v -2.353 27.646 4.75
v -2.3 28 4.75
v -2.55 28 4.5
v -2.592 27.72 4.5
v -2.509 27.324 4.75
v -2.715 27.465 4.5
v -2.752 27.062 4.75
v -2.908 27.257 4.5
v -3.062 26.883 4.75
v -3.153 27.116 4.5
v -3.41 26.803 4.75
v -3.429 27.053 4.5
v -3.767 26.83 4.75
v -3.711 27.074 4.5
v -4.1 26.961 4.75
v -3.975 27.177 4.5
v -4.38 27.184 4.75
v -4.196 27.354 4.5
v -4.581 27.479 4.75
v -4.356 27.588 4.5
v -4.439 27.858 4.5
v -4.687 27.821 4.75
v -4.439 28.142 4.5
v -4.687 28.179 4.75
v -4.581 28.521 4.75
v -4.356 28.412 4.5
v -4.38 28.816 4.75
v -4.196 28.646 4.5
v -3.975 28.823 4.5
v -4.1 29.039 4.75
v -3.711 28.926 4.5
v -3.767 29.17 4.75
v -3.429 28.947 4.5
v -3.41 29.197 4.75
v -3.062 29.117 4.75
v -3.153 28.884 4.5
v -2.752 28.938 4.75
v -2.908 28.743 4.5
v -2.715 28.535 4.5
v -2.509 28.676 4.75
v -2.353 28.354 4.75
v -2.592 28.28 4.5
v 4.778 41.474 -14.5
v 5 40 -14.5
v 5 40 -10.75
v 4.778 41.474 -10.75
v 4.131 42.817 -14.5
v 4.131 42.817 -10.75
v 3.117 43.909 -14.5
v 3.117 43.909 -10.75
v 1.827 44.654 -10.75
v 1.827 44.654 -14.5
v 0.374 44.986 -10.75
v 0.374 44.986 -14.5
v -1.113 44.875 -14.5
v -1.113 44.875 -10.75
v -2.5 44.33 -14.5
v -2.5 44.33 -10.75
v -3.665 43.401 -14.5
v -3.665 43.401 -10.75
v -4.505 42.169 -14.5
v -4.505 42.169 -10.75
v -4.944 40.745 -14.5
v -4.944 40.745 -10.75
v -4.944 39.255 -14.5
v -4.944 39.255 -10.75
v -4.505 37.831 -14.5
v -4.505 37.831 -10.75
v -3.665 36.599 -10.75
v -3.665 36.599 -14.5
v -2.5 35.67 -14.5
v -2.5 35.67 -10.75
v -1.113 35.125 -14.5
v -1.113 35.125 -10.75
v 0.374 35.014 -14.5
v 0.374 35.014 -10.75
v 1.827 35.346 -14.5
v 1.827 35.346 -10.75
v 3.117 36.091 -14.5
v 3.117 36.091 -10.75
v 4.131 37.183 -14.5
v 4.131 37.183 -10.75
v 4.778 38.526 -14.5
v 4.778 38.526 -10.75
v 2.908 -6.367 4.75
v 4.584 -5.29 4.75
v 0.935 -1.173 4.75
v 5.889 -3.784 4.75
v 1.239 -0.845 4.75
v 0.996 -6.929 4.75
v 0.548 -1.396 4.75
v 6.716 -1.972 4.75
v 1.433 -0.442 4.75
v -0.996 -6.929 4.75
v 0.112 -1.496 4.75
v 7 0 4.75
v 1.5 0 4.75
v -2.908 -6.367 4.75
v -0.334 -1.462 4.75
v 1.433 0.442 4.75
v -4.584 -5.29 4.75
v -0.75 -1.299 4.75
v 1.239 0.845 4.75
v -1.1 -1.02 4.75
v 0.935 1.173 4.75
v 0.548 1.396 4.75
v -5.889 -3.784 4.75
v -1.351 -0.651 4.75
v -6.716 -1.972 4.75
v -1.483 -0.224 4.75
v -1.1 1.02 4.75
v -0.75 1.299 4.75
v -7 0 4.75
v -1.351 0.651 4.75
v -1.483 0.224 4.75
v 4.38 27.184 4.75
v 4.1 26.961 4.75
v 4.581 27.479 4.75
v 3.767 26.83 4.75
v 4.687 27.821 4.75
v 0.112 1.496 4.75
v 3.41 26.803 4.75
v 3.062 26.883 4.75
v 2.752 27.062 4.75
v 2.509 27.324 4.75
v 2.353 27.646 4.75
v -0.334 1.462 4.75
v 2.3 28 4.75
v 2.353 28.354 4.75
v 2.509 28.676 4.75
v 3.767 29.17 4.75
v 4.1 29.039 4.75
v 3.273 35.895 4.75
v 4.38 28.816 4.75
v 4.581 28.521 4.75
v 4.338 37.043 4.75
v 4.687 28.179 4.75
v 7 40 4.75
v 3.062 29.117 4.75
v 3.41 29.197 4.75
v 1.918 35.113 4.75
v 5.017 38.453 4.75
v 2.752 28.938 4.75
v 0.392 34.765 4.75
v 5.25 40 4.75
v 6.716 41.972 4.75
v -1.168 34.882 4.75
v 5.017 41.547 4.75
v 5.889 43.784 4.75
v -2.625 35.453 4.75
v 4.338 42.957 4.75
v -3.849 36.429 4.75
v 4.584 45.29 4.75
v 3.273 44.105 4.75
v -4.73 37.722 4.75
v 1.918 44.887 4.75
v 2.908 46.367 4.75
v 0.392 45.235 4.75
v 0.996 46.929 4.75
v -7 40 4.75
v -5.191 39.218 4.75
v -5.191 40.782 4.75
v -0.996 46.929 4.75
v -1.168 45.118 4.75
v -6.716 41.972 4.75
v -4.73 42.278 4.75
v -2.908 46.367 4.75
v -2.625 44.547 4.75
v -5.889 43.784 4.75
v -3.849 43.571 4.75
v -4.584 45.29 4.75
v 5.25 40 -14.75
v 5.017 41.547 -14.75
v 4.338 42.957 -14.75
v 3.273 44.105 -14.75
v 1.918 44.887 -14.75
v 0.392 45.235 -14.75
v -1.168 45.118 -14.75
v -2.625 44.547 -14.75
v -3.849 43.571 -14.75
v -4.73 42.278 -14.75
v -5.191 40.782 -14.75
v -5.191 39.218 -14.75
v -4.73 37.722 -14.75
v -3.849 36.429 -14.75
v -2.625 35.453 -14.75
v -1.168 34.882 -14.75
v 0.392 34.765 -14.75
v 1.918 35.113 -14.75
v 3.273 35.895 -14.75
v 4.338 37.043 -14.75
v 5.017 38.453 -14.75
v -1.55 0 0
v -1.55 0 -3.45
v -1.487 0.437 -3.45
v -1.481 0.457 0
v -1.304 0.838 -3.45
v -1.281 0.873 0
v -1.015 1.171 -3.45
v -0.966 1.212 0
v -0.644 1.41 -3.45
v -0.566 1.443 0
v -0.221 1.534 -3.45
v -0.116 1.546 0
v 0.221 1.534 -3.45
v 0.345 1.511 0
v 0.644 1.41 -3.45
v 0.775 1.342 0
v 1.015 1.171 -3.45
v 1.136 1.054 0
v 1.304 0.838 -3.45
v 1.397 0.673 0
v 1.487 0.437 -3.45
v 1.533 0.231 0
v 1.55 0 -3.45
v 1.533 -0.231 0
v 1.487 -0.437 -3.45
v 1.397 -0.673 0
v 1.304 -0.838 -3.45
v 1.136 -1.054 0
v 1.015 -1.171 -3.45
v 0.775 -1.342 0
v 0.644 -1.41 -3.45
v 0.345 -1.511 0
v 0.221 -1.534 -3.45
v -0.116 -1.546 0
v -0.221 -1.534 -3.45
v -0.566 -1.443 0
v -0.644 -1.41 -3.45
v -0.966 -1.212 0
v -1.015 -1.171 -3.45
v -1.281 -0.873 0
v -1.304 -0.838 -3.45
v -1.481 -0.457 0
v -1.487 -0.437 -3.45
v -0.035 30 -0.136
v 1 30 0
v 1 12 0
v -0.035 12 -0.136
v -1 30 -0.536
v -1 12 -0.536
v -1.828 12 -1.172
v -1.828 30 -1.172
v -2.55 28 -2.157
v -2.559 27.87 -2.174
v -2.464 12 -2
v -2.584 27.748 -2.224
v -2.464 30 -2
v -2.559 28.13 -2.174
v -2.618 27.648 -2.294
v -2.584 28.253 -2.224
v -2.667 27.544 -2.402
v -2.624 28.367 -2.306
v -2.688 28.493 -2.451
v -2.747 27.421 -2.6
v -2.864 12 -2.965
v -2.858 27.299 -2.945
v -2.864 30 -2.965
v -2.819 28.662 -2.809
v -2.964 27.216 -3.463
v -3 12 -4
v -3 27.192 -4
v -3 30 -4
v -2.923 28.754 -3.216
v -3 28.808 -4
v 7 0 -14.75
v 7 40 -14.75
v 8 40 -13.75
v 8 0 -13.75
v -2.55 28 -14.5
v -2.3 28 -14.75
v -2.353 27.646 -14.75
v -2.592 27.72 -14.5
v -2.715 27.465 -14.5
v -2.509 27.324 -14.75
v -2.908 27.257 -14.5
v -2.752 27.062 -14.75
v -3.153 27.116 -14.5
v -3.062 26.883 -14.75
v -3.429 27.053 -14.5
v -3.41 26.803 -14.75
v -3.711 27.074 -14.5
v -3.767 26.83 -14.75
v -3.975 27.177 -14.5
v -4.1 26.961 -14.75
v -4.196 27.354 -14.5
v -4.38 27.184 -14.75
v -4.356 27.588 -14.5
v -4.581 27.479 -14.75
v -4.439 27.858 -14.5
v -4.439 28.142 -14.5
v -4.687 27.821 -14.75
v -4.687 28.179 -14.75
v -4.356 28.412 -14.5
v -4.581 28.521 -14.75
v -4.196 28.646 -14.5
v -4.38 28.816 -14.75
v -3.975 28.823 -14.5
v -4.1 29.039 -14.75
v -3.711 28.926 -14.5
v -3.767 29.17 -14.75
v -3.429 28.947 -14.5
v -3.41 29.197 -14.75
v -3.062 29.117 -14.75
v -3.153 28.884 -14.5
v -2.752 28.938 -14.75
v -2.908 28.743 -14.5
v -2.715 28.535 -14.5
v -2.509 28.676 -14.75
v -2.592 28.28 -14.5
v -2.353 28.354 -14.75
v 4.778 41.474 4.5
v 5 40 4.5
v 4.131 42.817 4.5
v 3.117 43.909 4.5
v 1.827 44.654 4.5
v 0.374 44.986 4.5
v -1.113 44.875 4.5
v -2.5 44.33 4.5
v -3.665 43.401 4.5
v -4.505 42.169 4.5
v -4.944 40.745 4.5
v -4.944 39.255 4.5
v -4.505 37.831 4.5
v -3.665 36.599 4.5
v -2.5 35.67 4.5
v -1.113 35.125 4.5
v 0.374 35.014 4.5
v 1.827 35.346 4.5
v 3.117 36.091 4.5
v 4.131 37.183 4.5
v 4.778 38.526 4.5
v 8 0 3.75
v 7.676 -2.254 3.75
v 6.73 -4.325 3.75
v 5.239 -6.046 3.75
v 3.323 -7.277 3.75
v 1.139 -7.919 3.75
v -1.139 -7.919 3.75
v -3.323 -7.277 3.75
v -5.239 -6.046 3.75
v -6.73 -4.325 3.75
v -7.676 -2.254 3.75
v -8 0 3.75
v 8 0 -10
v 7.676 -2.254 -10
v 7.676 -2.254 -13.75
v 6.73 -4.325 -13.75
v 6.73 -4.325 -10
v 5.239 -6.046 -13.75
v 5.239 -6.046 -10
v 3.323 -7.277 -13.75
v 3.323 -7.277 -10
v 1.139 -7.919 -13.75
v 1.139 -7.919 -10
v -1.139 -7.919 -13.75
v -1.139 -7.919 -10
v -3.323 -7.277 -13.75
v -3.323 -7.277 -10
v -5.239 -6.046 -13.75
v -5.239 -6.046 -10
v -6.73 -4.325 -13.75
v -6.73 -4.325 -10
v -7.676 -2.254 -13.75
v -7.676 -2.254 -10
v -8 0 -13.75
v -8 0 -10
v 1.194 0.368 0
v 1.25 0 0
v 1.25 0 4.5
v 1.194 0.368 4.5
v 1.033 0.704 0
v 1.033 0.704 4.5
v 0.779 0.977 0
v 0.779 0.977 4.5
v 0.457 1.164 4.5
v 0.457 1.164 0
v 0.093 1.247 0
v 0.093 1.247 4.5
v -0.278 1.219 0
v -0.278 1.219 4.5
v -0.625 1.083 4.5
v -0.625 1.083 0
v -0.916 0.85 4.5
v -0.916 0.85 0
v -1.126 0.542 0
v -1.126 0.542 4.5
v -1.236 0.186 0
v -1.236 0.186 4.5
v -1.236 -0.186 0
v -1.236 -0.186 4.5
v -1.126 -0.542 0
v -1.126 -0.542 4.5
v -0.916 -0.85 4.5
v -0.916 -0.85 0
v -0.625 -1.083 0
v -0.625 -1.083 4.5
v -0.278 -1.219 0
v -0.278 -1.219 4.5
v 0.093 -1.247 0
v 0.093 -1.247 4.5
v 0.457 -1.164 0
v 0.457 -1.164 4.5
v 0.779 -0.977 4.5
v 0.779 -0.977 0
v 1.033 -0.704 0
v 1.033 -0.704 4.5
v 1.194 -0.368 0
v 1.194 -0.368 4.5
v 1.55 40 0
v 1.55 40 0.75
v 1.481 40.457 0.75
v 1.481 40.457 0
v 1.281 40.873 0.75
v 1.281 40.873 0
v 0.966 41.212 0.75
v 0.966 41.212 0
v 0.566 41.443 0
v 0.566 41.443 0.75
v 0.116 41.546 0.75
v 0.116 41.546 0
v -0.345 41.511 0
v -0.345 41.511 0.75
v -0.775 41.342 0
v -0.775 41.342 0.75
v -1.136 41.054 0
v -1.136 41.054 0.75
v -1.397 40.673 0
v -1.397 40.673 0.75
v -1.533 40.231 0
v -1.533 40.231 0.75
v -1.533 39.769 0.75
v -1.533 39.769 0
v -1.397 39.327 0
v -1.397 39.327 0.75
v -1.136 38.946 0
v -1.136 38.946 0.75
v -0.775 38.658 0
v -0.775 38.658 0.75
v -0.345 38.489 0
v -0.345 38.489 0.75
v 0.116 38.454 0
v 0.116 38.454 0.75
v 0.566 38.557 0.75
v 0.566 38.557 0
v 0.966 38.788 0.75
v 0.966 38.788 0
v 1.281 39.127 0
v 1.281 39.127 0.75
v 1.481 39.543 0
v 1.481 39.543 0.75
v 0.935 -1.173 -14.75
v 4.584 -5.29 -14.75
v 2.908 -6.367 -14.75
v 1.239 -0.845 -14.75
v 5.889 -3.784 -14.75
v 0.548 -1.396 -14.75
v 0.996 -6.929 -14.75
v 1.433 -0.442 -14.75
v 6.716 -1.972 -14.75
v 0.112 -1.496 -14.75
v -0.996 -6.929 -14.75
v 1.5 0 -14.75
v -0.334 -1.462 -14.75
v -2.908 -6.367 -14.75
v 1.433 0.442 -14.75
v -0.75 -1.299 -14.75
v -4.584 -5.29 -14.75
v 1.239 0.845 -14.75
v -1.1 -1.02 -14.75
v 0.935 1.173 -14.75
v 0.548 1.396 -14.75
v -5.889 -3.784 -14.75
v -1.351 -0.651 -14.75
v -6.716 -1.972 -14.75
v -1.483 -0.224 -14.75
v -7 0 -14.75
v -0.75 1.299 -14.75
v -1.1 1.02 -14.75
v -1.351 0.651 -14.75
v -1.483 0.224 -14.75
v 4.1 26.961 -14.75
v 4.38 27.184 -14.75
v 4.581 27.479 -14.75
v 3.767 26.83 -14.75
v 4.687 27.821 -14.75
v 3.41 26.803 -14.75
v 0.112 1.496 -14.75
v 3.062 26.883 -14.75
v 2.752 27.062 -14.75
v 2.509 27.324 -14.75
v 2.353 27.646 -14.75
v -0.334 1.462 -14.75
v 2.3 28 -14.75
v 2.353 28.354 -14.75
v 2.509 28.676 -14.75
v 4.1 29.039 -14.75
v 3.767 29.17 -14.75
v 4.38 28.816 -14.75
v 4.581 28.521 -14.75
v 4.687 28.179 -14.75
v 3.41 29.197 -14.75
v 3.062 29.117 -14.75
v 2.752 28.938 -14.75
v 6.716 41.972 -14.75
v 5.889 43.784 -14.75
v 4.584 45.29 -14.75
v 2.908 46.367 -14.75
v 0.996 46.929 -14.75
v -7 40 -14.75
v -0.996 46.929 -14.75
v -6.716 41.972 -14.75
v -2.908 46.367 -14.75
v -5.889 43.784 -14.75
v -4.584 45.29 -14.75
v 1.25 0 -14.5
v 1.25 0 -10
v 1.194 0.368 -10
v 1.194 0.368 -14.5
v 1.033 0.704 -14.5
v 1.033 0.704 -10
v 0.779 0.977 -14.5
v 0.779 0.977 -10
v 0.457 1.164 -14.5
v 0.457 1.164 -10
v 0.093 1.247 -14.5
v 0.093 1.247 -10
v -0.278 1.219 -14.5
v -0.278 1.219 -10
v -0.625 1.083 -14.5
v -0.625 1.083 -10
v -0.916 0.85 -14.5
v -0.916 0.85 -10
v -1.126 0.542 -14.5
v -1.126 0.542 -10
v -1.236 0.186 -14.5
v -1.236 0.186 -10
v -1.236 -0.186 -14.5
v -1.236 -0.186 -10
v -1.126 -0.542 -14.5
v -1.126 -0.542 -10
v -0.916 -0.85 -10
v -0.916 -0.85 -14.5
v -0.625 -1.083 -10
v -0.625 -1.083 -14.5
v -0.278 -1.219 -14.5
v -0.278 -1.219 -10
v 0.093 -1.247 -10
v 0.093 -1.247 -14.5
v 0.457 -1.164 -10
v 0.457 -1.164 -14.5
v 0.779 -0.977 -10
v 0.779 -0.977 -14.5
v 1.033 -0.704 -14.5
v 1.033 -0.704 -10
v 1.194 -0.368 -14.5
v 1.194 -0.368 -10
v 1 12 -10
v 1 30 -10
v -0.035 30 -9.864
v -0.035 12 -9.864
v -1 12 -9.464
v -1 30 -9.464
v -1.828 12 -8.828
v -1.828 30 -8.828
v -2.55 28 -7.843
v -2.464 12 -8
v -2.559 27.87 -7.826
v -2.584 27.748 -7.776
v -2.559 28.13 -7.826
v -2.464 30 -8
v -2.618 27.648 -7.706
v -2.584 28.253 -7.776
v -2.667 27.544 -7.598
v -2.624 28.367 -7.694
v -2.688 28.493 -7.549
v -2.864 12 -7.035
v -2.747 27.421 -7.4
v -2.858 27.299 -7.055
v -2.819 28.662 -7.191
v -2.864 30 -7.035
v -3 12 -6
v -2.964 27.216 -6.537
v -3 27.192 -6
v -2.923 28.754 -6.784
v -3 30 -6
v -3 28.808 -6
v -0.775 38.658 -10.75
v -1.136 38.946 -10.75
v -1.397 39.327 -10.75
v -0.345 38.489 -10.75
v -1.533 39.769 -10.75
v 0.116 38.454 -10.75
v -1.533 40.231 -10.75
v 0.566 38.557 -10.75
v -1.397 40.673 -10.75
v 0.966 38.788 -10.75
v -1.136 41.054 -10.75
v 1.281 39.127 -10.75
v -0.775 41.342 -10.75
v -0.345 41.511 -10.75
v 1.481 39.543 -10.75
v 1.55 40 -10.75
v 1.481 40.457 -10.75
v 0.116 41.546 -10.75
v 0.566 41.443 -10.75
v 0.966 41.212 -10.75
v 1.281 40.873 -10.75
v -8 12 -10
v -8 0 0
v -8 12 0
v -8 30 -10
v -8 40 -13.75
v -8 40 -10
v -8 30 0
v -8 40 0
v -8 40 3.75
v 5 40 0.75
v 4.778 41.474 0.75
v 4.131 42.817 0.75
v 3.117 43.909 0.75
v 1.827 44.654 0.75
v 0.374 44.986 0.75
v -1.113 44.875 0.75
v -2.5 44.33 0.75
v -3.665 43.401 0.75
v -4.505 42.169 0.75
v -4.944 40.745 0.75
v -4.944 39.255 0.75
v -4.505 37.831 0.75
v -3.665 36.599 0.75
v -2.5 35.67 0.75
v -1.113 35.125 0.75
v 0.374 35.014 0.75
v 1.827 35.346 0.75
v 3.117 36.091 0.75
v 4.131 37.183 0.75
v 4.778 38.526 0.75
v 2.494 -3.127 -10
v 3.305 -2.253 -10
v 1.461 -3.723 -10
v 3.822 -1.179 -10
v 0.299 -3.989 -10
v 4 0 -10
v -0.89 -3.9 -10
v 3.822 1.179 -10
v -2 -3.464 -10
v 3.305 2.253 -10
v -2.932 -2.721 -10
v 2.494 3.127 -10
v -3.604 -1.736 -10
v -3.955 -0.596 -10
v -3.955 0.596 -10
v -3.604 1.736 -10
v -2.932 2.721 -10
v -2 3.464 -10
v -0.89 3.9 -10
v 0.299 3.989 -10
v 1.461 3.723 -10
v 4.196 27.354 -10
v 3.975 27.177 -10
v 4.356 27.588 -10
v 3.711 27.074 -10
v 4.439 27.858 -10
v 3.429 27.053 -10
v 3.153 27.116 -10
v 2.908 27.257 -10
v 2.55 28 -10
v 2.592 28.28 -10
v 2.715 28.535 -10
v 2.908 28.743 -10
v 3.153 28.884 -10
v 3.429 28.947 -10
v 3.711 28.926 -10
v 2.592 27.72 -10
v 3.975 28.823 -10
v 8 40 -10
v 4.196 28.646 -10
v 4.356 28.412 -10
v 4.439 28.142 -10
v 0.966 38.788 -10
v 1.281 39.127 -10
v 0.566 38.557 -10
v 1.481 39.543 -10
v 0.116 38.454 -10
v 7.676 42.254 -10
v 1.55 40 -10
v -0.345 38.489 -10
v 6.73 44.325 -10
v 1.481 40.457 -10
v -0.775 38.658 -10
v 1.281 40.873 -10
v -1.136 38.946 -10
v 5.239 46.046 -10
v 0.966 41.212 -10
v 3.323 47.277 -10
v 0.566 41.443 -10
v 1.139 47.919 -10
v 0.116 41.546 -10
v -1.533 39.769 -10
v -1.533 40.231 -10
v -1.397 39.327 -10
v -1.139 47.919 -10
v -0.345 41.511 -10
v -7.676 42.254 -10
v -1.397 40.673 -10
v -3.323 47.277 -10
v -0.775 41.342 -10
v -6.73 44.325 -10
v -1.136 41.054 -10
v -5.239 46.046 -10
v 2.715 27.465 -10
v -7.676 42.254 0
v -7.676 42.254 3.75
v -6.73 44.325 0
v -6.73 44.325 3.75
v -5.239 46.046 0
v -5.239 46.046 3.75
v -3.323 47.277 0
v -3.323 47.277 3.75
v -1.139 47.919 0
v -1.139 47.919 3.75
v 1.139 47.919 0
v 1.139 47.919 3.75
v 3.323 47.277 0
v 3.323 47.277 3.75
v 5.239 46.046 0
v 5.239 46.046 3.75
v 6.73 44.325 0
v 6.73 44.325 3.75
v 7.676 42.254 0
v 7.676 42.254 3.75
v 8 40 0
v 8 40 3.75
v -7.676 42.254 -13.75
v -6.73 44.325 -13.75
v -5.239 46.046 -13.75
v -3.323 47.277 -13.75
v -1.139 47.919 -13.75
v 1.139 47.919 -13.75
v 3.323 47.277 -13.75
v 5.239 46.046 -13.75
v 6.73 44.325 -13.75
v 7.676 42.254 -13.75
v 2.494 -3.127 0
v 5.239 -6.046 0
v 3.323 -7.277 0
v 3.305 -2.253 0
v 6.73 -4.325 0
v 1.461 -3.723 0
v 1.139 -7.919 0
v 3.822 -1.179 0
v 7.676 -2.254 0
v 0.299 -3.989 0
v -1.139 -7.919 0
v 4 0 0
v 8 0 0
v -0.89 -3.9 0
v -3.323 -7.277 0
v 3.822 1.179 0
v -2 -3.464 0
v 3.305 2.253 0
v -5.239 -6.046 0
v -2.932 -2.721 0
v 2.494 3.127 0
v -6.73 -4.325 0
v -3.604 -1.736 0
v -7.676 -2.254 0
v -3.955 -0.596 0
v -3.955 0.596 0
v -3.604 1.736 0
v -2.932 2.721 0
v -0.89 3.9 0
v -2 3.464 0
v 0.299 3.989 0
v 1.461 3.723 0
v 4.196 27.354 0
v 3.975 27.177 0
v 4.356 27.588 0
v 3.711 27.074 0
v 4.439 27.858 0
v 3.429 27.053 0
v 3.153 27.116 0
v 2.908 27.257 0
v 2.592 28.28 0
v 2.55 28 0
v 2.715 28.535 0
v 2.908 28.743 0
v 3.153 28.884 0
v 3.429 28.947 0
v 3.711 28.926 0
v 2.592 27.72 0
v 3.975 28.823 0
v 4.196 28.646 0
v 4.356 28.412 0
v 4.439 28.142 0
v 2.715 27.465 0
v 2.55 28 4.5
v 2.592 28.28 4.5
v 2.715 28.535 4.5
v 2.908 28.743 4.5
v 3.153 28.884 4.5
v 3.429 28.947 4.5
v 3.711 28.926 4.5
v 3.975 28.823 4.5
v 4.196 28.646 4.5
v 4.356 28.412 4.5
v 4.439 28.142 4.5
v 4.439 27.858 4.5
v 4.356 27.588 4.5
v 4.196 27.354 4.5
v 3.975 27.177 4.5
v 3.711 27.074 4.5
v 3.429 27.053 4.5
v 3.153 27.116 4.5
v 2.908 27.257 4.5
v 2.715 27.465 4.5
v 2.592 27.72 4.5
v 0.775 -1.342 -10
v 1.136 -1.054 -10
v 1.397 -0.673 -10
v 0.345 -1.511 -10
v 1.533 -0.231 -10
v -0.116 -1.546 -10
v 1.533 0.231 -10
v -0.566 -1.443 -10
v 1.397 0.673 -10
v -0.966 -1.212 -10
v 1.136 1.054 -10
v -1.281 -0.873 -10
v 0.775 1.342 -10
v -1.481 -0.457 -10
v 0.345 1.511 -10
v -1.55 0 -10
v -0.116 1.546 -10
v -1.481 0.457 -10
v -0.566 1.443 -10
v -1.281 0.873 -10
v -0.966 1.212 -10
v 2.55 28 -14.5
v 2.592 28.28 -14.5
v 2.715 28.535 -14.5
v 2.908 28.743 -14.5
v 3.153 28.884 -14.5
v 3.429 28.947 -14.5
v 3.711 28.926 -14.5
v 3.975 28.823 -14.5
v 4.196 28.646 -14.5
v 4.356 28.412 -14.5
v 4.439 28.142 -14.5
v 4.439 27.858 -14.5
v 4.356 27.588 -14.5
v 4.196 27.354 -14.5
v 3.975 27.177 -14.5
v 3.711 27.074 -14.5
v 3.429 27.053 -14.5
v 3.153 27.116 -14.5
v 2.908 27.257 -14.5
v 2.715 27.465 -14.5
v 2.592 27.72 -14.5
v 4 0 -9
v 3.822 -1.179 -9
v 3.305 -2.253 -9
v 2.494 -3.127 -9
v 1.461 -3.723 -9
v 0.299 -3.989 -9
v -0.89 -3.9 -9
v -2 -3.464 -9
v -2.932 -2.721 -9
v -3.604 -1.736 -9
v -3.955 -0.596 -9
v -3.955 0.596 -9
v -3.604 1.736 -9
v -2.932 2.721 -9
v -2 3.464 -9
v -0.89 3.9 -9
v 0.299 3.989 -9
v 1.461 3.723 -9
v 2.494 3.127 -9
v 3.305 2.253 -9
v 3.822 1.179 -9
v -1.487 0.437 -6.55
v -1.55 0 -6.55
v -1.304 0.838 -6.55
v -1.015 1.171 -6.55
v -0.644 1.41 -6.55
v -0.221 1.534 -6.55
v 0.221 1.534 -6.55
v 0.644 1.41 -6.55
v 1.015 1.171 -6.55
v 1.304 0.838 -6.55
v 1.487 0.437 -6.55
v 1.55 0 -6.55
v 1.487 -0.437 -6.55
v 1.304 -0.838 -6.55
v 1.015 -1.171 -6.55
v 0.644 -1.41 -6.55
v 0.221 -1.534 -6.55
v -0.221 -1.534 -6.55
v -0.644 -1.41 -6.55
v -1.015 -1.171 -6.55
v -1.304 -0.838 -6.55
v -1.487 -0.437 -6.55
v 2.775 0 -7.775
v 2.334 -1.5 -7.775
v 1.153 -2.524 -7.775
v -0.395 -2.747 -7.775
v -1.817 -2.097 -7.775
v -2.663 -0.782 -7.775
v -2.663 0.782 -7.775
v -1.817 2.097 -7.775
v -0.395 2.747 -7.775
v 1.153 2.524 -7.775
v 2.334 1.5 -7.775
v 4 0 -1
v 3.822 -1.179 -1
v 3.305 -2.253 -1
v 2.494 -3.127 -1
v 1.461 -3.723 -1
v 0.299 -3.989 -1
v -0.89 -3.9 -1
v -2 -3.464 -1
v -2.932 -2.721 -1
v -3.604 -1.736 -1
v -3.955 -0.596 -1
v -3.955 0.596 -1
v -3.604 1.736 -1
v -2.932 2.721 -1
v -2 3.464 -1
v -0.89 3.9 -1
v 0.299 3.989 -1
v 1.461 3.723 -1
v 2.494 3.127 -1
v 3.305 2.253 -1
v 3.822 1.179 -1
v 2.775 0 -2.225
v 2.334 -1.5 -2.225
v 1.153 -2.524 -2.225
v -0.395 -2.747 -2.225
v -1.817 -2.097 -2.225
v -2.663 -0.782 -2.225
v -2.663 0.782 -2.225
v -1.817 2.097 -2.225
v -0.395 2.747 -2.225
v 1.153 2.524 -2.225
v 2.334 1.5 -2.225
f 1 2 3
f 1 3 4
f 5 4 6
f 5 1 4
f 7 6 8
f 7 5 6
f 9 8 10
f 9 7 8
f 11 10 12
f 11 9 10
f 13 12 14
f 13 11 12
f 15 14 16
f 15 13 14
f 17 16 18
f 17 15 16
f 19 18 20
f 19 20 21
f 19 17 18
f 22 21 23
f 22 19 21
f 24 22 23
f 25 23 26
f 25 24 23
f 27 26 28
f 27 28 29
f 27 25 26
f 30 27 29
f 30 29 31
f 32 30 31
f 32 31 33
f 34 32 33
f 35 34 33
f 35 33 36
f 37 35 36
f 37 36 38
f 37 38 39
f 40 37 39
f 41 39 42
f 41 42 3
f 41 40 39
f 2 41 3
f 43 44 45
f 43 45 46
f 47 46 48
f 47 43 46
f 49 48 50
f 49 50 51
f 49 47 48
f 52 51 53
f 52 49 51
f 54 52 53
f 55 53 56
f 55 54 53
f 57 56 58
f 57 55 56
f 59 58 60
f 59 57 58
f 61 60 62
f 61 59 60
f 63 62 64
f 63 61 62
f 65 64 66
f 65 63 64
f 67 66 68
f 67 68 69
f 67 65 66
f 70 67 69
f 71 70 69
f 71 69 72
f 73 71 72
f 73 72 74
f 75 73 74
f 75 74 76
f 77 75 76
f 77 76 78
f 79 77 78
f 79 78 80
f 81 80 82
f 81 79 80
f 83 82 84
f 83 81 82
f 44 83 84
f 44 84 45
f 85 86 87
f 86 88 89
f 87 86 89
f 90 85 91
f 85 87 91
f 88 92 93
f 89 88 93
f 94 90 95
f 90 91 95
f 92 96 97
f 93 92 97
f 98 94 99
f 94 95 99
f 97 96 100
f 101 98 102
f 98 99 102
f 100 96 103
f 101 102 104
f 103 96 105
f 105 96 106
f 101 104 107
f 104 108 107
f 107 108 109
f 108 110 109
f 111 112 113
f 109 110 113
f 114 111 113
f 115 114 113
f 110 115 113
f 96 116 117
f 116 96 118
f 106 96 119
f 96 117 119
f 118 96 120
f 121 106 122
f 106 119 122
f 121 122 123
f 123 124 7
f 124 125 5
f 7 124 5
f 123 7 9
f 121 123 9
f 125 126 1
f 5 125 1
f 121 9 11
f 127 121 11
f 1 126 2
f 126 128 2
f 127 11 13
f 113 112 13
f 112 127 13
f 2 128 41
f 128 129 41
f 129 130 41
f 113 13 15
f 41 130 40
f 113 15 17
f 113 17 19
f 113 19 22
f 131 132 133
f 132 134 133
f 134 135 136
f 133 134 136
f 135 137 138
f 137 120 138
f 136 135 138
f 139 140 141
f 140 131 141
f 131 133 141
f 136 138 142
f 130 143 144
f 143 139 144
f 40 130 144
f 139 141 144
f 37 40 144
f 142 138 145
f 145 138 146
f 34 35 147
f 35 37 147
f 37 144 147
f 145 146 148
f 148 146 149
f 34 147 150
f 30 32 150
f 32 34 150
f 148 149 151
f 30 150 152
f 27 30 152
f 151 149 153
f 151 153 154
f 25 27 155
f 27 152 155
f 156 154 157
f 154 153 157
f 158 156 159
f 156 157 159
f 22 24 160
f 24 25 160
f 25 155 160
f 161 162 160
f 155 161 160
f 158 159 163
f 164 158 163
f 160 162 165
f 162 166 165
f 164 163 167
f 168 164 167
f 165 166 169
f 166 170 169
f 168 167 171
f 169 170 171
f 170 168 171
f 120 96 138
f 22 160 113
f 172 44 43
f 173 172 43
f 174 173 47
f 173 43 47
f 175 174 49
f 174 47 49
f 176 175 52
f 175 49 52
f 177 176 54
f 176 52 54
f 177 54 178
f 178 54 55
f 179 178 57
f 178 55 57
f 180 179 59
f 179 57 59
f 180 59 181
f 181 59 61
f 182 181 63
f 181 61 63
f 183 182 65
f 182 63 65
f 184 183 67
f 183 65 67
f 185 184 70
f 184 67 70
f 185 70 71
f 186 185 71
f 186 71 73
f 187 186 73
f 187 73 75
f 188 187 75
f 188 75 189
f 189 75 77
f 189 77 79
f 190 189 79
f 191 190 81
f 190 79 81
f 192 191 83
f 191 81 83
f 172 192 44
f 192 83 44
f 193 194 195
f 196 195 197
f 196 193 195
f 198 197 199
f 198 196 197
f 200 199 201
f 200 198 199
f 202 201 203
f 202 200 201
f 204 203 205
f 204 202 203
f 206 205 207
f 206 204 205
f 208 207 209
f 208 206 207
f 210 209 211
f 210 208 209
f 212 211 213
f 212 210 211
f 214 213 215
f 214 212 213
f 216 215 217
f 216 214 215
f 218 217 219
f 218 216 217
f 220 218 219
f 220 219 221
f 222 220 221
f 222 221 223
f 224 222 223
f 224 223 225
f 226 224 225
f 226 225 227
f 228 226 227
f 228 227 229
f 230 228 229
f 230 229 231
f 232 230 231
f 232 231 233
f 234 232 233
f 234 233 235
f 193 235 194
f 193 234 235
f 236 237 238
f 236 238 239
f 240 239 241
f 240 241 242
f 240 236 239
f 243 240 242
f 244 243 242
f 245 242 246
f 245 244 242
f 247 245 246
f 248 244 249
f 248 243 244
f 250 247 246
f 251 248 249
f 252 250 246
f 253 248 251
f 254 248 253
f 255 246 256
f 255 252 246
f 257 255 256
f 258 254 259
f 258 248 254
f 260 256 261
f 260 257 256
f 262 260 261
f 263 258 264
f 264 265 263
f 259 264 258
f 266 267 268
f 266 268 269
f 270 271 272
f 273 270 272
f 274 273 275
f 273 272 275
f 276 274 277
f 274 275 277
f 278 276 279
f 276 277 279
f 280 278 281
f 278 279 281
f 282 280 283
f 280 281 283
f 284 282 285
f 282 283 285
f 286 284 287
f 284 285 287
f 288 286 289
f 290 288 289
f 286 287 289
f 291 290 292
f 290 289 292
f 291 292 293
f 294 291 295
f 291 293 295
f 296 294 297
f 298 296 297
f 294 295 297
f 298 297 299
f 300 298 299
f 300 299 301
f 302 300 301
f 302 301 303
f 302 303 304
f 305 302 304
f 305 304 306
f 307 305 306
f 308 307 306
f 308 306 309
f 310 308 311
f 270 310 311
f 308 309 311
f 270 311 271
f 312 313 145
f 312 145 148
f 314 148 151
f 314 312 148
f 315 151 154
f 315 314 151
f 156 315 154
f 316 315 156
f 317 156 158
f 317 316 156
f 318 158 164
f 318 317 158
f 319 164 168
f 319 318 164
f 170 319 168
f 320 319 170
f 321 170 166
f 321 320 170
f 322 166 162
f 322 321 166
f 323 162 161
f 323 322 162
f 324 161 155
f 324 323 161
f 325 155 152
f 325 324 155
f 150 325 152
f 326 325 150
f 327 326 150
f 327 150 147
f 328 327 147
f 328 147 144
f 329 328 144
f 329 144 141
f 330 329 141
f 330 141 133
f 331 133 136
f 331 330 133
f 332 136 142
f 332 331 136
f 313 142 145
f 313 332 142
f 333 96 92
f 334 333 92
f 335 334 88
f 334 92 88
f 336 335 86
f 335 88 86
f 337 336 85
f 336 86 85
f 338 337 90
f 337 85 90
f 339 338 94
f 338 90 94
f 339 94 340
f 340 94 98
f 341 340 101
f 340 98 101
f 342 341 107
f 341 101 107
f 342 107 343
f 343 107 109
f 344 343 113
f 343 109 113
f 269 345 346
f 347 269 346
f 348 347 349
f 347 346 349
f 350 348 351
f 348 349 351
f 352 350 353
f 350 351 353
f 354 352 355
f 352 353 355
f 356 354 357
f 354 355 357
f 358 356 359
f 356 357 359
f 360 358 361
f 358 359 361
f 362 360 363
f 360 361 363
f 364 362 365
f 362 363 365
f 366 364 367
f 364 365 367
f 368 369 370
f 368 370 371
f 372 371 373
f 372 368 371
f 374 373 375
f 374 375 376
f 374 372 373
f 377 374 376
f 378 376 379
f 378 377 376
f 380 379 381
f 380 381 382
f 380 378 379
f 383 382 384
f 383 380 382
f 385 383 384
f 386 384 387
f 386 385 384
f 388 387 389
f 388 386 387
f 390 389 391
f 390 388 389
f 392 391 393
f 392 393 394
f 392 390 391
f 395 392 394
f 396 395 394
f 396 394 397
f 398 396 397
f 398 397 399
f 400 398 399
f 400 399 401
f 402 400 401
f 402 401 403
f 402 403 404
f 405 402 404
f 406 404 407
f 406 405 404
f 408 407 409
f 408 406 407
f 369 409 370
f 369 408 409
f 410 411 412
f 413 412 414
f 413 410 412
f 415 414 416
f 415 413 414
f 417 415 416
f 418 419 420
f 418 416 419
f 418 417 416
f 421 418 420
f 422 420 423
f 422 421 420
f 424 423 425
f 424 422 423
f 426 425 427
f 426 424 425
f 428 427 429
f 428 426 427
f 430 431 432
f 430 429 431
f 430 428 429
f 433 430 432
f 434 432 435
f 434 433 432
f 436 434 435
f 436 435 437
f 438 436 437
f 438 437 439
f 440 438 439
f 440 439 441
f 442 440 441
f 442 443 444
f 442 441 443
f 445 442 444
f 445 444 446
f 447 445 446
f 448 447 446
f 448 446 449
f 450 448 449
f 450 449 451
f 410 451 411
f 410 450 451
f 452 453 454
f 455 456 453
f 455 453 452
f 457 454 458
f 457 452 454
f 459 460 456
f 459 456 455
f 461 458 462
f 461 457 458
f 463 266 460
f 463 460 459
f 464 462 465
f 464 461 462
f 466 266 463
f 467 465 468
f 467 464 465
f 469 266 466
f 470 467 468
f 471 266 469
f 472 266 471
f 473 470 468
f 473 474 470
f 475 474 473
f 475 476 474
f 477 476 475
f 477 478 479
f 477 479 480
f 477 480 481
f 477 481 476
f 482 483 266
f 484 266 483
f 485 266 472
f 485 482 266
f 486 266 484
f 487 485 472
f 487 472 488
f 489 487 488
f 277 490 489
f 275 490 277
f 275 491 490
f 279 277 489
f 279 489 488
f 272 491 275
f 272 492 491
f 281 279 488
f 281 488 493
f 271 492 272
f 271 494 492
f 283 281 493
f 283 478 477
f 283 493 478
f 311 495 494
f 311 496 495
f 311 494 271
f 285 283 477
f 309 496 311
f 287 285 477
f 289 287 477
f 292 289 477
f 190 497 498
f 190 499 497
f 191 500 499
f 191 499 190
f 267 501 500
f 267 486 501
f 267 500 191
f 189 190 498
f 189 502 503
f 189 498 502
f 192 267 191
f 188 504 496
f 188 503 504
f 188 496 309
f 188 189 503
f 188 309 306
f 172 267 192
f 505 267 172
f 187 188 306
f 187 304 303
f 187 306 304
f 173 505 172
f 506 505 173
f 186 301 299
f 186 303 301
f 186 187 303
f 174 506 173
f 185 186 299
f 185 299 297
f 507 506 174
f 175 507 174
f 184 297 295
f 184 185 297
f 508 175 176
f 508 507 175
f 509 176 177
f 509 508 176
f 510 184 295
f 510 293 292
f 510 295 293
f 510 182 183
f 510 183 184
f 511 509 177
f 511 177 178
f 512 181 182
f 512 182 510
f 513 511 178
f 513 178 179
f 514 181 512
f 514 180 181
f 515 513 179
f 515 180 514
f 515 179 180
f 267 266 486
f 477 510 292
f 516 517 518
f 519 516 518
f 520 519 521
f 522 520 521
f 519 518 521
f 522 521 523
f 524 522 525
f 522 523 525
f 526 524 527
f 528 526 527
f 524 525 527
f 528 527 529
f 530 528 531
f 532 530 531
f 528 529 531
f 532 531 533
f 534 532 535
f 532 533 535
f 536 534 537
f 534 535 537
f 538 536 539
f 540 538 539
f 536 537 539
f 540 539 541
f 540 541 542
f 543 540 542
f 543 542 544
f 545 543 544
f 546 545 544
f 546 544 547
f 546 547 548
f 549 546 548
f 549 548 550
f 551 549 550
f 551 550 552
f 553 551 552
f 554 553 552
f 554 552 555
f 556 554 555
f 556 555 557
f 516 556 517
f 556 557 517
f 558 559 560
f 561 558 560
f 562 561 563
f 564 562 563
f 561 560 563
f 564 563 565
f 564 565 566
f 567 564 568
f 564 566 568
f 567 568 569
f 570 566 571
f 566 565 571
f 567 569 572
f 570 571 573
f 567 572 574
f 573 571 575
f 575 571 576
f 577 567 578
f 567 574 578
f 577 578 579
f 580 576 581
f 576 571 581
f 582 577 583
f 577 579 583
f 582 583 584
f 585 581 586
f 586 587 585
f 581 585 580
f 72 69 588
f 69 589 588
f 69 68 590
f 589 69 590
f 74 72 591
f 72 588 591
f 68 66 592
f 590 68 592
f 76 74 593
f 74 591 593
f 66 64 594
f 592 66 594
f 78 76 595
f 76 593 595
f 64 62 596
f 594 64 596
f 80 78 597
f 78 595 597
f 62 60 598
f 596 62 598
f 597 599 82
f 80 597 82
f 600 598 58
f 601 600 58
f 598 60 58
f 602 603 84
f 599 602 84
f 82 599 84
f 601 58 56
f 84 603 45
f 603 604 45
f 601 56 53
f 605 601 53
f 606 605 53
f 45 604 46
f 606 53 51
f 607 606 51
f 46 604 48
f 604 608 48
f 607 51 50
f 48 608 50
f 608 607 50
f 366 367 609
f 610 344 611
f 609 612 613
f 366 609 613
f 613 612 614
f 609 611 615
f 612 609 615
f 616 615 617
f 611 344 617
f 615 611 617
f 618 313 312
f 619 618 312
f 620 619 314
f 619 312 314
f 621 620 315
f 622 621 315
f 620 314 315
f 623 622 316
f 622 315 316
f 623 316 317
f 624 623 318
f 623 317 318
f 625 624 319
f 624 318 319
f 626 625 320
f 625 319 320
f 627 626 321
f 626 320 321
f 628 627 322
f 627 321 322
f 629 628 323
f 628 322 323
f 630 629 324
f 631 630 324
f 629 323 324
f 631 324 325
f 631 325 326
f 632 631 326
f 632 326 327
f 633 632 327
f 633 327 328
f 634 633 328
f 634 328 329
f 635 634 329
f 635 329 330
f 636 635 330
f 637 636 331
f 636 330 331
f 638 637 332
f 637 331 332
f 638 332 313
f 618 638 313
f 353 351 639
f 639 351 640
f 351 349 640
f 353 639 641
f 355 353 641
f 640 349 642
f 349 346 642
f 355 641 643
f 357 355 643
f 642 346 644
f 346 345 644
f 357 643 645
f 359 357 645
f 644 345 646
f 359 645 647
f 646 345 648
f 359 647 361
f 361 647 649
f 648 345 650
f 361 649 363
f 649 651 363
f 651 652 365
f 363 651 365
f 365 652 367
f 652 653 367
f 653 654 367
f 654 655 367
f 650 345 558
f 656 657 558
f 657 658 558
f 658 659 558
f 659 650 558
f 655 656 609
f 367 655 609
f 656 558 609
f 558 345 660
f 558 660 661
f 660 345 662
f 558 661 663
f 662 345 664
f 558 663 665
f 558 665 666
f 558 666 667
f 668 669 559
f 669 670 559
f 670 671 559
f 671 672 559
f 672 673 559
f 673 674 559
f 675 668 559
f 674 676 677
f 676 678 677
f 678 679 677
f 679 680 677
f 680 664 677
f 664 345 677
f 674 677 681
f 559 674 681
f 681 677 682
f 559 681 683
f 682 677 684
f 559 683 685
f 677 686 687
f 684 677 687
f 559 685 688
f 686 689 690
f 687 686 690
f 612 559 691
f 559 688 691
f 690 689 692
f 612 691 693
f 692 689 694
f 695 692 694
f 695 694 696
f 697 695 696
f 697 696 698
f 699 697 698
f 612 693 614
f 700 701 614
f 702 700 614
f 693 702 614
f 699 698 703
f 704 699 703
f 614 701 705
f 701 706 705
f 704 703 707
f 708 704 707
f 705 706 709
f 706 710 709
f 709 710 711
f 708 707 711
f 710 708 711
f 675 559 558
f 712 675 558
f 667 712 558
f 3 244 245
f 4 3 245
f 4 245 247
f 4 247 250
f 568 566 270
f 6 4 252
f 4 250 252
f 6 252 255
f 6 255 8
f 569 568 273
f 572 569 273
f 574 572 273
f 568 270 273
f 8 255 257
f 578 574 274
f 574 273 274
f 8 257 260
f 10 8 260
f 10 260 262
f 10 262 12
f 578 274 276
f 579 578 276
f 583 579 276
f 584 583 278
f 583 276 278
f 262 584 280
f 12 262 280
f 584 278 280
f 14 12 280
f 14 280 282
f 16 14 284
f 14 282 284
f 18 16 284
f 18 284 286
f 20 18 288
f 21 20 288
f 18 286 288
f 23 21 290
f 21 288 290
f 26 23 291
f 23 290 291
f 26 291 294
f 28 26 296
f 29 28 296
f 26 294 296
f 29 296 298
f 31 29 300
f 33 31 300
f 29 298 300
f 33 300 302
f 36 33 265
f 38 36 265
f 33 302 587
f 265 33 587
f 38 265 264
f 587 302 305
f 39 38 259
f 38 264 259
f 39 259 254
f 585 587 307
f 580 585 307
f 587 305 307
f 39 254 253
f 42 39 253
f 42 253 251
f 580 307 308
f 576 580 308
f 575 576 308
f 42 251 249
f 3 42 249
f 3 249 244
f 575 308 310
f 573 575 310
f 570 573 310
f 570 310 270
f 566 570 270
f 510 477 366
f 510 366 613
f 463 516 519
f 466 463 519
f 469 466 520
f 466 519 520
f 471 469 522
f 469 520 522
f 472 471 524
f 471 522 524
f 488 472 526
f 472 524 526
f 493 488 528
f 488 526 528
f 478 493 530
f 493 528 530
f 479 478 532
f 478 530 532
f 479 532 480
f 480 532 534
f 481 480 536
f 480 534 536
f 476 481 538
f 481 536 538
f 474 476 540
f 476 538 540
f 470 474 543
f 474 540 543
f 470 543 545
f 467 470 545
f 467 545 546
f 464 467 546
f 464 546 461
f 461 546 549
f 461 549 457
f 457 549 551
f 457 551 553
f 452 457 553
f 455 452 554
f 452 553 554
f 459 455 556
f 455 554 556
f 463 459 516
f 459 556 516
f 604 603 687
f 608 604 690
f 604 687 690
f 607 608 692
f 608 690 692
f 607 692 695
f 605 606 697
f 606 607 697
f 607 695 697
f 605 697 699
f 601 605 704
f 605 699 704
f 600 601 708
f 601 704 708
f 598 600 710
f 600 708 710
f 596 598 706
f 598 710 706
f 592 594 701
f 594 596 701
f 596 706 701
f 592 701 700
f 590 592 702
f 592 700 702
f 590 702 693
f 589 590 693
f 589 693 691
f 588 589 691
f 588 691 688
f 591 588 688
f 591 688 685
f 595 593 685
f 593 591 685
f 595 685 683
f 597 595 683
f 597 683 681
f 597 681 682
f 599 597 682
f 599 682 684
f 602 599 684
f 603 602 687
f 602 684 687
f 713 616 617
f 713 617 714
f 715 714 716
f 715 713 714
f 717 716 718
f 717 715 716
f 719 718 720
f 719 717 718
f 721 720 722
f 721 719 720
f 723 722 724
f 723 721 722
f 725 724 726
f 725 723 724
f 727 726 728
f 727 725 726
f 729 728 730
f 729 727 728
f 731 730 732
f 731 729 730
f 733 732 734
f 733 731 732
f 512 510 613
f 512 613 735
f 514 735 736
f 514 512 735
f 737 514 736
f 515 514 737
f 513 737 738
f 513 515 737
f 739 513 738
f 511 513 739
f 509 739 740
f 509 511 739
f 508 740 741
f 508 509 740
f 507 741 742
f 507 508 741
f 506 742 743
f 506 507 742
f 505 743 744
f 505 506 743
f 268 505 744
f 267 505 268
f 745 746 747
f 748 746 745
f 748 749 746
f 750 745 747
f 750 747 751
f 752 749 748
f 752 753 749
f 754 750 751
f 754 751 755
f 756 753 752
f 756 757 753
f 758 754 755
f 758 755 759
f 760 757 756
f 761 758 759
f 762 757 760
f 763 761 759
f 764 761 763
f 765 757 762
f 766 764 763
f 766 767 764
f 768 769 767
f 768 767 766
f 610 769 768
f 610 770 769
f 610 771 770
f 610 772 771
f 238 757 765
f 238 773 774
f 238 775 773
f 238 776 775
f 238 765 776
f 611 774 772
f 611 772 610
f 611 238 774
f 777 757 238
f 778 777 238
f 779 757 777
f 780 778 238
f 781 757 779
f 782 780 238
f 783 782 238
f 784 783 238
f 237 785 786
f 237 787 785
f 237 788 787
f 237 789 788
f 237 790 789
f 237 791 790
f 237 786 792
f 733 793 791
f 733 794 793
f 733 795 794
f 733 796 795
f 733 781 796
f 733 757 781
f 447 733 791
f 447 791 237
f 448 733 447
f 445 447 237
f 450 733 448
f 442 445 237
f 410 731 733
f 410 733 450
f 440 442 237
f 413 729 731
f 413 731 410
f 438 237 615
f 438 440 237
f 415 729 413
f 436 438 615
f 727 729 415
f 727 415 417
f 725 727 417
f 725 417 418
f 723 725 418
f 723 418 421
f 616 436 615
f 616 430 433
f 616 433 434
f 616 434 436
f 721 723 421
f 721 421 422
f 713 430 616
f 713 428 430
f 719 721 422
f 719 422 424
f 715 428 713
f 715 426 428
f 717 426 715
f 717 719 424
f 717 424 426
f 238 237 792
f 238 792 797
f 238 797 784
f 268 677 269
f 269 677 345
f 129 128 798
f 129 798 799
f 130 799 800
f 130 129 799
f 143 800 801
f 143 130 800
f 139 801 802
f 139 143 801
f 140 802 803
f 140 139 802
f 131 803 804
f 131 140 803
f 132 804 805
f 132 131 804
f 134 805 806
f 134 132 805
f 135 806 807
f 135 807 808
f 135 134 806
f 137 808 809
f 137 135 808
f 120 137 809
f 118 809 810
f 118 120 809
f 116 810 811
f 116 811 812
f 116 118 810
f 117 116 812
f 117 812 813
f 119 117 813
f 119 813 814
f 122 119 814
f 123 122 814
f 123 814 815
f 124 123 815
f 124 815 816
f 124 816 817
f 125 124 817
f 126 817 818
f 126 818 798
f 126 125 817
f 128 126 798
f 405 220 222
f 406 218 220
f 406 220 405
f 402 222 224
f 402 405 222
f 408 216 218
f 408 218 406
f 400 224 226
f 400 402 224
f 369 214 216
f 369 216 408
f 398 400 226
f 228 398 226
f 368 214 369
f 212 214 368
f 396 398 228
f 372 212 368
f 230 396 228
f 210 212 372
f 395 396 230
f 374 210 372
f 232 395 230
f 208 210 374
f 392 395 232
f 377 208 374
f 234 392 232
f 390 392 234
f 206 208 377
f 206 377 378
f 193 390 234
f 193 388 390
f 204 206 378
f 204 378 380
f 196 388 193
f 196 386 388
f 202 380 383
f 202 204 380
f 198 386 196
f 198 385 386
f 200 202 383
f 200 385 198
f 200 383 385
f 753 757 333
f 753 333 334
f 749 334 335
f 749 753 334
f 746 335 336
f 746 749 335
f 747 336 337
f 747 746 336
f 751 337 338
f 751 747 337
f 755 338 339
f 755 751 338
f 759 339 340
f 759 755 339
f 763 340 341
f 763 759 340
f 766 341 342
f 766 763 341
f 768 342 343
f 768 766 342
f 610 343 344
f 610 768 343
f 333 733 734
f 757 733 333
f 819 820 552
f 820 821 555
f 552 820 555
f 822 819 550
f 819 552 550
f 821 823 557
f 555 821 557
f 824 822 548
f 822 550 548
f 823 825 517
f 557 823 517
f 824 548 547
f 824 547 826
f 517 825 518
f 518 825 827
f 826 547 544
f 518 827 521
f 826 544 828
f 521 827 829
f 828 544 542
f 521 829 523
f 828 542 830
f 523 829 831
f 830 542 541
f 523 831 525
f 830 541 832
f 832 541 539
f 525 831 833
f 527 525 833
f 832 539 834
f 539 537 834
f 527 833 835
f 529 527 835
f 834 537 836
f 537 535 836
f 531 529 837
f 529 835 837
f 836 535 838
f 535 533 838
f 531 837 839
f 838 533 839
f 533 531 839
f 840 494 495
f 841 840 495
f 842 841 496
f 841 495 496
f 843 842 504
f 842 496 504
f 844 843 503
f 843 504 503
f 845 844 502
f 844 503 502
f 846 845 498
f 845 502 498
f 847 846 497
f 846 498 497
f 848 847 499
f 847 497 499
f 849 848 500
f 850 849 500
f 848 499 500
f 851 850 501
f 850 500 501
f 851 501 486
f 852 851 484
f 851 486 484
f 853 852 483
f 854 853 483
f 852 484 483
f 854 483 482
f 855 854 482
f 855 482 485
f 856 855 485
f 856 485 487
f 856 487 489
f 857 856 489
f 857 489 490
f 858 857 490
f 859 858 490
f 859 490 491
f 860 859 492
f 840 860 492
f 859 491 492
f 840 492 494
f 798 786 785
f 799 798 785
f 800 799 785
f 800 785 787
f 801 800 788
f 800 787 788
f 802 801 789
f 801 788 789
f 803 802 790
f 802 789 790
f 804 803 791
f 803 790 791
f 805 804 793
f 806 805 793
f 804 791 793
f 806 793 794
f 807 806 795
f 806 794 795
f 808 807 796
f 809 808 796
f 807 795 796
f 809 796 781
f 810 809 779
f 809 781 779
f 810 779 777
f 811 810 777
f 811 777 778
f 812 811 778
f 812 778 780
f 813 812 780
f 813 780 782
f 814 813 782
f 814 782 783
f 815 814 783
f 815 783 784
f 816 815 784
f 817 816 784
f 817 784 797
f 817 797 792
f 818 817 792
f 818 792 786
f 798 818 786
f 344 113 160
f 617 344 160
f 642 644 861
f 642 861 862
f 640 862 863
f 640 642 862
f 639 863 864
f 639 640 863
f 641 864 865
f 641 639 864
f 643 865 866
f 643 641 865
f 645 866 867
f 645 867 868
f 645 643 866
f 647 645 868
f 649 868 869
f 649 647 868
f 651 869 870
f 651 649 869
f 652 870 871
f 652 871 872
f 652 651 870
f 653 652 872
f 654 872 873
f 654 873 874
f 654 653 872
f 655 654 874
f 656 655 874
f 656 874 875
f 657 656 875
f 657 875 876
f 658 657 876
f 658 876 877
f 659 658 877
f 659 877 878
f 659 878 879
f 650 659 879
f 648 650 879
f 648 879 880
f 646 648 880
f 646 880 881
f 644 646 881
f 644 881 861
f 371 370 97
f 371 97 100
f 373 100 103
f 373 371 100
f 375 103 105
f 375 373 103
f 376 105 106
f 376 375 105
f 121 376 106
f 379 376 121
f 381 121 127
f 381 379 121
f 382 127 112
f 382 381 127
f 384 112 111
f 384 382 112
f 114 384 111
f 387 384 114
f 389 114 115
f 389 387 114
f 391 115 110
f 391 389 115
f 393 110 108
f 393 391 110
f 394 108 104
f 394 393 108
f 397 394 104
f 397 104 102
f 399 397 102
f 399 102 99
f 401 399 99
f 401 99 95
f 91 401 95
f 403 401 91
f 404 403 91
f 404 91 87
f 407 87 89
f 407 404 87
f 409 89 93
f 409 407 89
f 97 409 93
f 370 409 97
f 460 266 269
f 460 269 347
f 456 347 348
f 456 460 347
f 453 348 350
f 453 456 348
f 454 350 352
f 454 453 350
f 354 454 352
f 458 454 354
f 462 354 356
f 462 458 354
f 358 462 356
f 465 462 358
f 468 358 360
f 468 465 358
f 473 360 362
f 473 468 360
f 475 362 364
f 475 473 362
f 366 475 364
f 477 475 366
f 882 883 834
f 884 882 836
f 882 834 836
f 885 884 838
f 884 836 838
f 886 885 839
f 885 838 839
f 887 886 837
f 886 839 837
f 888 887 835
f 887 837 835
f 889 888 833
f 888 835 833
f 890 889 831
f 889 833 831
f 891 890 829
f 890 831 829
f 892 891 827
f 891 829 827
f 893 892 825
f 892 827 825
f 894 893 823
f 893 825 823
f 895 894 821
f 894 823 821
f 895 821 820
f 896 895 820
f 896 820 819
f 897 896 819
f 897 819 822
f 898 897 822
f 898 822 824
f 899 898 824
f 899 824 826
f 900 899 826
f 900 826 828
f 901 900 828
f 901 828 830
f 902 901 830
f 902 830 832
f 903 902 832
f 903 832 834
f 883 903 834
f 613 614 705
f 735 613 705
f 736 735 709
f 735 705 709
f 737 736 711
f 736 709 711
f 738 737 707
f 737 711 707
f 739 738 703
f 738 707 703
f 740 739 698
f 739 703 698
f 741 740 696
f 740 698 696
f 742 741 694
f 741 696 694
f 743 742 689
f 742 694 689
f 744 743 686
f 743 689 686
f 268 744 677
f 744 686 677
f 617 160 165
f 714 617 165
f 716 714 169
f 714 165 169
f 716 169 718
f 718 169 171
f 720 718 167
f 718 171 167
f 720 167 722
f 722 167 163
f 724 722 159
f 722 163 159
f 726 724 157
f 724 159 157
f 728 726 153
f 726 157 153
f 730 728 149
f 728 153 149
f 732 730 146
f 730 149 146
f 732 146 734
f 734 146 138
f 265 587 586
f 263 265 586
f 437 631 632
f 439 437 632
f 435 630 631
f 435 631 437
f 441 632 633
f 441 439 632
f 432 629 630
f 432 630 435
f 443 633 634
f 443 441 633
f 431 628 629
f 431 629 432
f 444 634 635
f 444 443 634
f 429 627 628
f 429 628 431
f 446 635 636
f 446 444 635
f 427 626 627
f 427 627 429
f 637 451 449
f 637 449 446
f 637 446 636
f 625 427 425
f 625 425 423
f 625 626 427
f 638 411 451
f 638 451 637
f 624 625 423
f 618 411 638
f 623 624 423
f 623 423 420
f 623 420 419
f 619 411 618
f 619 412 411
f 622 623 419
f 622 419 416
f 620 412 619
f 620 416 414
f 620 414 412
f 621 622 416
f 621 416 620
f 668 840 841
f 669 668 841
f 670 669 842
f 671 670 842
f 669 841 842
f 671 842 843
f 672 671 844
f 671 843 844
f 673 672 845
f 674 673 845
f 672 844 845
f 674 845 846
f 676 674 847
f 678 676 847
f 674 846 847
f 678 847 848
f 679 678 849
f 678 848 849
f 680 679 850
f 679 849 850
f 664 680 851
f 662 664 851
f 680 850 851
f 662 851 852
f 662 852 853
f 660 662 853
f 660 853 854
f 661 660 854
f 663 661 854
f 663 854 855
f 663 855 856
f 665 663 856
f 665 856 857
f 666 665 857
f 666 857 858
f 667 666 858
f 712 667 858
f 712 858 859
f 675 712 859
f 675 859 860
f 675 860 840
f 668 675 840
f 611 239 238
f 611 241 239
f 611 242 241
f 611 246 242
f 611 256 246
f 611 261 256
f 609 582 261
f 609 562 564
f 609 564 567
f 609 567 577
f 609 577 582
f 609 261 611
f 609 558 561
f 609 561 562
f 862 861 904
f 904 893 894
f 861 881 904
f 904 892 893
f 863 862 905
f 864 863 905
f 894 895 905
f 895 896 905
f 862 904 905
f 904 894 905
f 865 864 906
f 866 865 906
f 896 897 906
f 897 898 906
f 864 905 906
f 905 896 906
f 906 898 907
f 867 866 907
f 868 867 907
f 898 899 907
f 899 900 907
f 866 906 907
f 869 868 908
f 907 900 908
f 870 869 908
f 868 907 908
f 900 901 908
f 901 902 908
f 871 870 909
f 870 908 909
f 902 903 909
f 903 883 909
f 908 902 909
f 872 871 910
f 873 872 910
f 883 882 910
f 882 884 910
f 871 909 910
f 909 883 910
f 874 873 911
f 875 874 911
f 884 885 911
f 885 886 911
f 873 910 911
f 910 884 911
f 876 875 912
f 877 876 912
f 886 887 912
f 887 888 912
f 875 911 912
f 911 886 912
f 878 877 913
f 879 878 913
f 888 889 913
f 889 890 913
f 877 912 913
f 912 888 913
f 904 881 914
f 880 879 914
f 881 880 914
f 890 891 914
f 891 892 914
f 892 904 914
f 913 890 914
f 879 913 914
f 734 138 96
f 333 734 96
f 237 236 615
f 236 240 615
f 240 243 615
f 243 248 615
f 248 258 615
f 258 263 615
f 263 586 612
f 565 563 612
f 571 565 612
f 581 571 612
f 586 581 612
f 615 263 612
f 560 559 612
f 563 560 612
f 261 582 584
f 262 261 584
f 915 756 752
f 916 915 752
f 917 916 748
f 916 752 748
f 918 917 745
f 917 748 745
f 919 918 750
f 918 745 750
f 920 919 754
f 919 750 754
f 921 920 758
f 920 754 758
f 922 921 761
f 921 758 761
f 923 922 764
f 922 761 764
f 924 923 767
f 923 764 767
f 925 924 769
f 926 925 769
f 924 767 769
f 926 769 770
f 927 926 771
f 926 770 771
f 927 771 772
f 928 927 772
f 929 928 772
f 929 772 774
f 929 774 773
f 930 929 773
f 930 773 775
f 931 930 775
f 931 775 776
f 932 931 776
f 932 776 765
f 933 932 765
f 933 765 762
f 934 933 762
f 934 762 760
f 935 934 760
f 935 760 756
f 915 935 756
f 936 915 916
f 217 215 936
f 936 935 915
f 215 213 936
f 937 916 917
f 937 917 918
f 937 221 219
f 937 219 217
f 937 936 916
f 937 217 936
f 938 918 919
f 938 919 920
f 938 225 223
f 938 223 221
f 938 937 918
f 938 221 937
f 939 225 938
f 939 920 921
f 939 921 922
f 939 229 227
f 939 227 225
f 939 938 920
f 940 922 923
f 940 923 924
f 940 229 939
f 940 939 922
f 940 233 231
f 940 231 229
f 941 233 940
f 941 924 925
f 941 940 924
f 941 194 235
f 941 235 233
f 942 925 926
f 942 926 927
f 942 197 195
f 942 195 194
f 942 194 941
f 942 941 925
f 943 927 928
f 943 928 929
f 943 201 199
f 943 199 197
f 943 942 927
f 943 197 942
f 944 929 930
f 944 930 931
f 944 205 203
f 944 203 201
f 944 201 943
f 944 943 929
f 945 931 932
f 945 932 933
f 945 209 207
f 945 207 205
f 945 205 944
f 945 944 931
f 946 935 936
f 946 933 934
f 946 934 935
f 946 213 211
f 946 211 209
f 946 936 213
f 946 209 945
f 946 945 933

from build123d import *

# Parameters (mm, degrees)
SKETCH1_R           = 1.55
SKETCH1_R_2         = 1.25
BOSS_EXTRUDE1_DEPTH = 4.75
FILLET2_SIZE        = 1
SKETCH2_R           = 5
CUT_EXTRUDE1_DEPTH  = 4
SKETCH3_W           = 5
SKETCH3_H           = 18
BOSS_EXTRUDE2_DEPTH = 5
SKETCH8_R           = 4
SKETCH8_R_2         = 1.55
BOSS_EXTRUDE4_DEPTH = 4
FILLET3_R           = 4
SKETCH7_R           = 0.95
CUT_EXTRUDE3_DEPTH  = 53.423754158
CHAFL_N1_SIZE       = 0.25
CHAFL_N2_SIZE       = 3


with BuildPart() as part:
    # Sketch1 → Boss-Extrude1 (new body)
    with BuildSketch(Plane.XY):
        with BuildLine():
            Line((-8, 0), (-8, 40))
            ThreePointArc((-8, 40), (0, 48), (8, 40))
            Line((8, 40), (8, 0))
            ThreePointArc((8, 0), (0, -8), (-8, 0))
        make_face()
        with Locations((0, 40)):
            Circle(SKETCH1_R, mode=Mode.SUBTRACT)
        Circle(SKETCH1_R_2, mode=Mode.SUBTRACT)
    extrude(amount=BOSS_EXTRUDE1_DEPTH)

    # Fillet2
    fillet2_edges = [part.edges().sort_by_distance(p)[0] for p in [
        (0, 48, 4.75),
        (-8, 20, 4.75),
        (0, -8, 4.75),
        (8, 20, 4.75),
    ]]
    chamfer(fillet2_edges, length=FILLET2_SIZE)

    # Sketch2 → Cut-Extrude1 (cut)
    with BuildSketch(Plane.XY.offset(4.75)):
        with Locations((0, 40)):
            Circle(SKETCH2_R)
    extrude(amount=-CUT_EXTRUDE1_DEPTH, mode=Mode.SUBTRACT)

    # Sketch3 → Boss-Extrude2 (add)
    with BuildSketch(Plane(origin=(0, 0, 0), x_dir=(-1, 0, 0), z_dir=(0, 0, -1))):
        with Locations((5.5, 21)):
            Rectangle(SKETCH3_W, SKETCH3_H)
    extrude(amount=BOSS_EXTRUDE2_DEPTH)

    # Sketch8 → Boss-Extrude4 (add)
    with BuildSketch(Plane(origin=(0, 0, 0), x_dir=(-1, 0, 0), z_dir=(0, 0, -1))):
        with Locations(Location((0, 0, 0), (0, 0, 180))):
            Circle(SKETCH8_R)
        Circle(SKETCH8_R_2, mode=Mode.SUBTRACT)
    extrude(amount=BOSS_EXTRUDE4_DEPTH)

    # Fillet3
    fillet3_edges = [part.edges().sort_by_distance(p)[0] for p in [
        (-3, 21, 0),
    ]]
    fillet(fillet3_edges, radius=FILLET3_R)

    # Mirror5: part across plane


with BuildPart() as part_1:
    add(part.part)
    add(part.part.mirror(Plane.XY.offset(-5)))

    # Sketch7 → Cut-Extrude3 (cut, through all)
    with BuildSketch(Plane(origin=(0, 0, -14.75), x_dir=(-1, 0, 0), z_dir=(0, 0, -1))):
        with Locations((-3.5, 28)):
            Circle(SKETCH7_R)
        with Locations(Location((3.5, 28, 0), (0, 0, 180))):
            Circle(SKETCH7_R)
    extrude(amount=-CUT_EXTRUDE3_DEPTH, mode=Mode.SUBTRACT)

    # Chaflán1
    chafl_n1_edges = [part_1.edges().sort_by_distance(p)[0] for p in [
        (4.45, 28, 4.75),
        (4.45, 28, -14.75),
        (-4.45, 28, 4.75),
        (-4.45, 28, -14.75),
        (-1.25, 0, 4.75),
        (-5, 40, 4.75),
        (-5, 40, -14.75),
        (-1.25, 0, -14.75),
    ]]
    chamfer(chafl_n1_edges, length=CHAFL_N1_SIZE)

    # Chaflán2
    # the kernel refuses this chamfer: 3 mm, written as the material it takes off along each edge
    with BuildSketch(Plane(origin=(0, 0, -6), x_dir=(1, 0, 0), z_dir=(0, 1, 0))) as chafl_n2_piece_1:
        Polygon((4, CHAFL_N2_SIZE), (4 - CHAFL_N2_SIZE, 0), (4, 0), align=None)
    revolve(axis=Axis((0, 0, -6), (0, 0, -1)), mode=Mode.SUBTRACT)
    with BuildSketch(Plane(origin=(0, 0, -4), x_dir=(1, 0, 0), z_dir=(0, 1, 0))) as chafl_n2_piece_2:
        Polygon((4, -CHAFL_N2_SIZE), (4 - CHAFL_N2_SIZE, 0), (4, 0), align=None)
    revolve(axis=Axis((0, 0, -4), (0, 0, -1)), mode=Mode.SUBTRACT)


solid = part_1.part
